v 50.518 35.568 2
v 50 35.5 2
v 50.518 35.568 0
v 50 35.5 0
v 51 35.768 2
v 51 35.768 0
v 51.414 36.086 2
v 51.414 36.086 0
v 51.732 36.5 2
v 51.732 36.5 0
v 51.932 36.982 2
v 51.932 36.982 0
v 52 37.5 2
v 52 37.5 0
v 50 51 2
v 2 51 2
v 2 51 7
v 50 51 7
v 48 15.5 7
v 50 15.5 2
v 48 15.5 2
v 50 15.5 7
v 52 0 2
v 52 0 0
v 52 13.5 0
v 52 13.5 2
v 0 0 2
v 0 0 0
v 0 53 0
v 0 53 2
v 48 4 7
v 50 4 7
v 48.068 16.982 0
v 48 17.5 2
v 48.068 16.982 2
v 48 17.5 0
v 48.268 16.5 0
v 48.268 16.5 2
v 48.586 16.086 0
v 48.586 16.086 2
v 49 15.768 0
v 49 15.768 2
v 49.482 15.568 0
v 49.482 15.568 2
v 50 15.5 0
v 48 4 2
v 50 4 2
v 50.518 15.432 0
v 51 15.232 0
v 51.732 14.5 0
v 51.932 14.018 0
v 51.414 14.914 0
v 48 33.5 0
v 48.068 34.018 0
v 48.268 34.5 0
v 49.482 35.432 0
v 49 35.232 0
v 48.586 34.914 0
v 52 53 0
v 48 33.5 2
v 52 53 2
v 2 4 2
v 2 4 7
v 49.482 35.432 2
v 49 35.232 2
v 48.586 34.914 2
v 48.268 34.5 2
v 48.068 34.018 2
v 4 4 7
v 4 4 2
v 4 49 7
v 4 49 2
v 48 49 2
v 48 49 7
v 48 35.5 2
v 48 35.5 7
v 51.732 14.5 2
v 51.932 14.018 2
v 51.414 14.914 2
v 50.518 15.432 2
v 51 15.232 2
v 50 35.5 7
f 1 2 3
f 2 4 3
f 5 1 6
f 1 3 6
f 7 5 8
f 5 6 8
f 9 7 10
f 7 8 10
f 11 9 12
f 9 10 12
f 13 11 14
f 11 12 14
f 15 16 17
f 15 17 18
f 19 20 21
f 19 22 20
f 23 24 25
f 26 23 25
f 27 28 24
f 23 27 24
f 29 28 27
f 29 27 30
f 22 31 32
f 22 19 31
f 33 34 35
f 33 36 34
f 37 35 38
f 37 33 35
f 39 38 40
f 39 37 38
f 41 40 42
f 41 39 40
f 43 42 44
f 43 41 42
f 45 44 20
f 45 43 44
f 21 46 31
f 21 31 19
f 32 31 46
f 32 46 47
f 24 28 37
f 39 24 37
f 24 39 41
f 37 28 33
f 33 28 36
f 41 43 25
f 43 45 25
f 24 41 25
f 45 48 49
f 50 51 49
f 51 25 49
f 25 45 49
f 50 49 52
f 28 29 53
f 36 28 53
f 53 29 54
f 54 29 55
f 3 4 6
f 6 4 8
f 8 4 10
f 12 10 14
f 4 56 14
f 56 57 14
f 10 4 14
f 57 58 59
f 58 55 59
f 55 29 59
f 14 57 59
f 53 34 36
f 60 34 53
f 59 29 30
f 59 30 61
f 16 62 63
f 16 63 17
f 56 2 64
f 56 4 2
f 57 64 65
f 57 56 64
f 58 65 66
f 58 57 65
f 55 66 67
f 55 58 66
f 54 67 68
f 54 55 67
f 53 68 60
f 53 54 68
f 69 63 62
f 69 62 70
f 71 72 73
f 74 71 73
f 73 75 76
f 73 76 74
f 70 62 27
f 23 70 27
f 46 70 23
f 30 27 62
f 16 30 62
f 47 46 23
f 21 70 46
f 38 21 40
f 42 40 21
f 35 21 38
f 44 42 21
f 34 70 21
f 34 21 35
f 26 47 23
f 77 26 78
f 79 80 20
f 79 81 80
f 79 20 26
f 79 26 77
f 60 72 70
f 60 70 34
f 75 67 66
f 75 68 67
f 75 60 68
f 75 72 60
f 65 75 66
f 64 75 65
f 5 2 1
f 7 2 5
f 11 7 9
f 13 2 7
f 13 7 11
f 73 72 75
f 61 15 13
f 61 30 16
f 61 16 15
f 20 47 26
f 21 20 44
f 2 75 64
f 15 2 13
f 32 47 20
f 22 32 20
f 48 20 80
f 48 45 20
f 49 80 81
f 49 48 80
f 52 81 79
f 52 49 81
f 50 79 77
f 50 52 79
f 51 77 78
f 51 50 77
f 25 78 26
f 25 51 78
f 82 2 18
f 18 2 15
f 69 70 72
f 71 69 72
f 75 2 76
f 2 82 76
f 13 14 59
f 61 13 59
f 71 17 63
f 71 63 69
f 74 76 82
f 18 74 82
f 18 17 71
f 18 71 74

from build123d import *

# Parameters (mm, degrees)
SKETCH1_W           = 52
SKETCH1_H           = 53
BOSS_EXTRUDE1_DEPTH = 2
SKETCH2_W           = 48
SKETCH2_H           = 49
SKETCH2_W_2         = 44
SKETCH2_H_2         = 45
BOSS_EXTRUDE2_DEPTH = 5
CUT_EXTRUDE1_START  = -7
SKETCH3_W           = 4
SKETCH3_H           = 20
CUT_EXTRUDE1_DEPTH  = 7
FILLET1_R           = 2
SKETCH4_W           = 48
SKETCH4_H           = 2
CUT_EXTRUDE2_DEPTH  = 5


with BuildPart() as part:
    # Sketch1 → Boss-Extrude1 (new body)
    with BuildSketch(Plane.XY):
        with Locations((26, 26.5)):
            Rectangle(SKETCH1_W, SKETCH1_H)
    extrude(amount=BOSS_EXTRUDE1_DEPTH)

    # Sketch2 → Boss-Extrude2 (add)
    with BuildSketch(Plane.XY.offset(2)):
        with Locations((26, 26.5)):
            Rectangle(SKETCH2_W, SKETCH2_H)
        with Locations((26, 26.5)):
            Rectangle(SKETCH2_W_2, SKETCH2_H_2, mode=Mode.SUBTRACT)
    extrude(amount=BOSS_EXTRUDE2_DEPTH)

    # Sketch3 → Cut-Extrude1 (cut)
    with BuildSketch(Plane(origin=(0, 0, 0), x_dir=(-1, 0, 0), z_dir=(0, 0, -1)).offset(CUT_EXTRUDE1_START)):
        with Locations((-50, 25.5)):
            Rectangle(SKETCH3_W, SKETCH3_H)
    extrude(amount=CUT_EXTRUDE1_DEPTH, mode=Mode.SUBTRACT)

    # Fillet1
    fillet1_edges = [part.edges().sort_by_distance(p)[0] for p in [
        (48, 15.5, 1),
        (48, 35.5, 1),
    ]]
    fillet(fillet1_edges, radius=FILLET1_R)
    fillet1_2_edges = [part.edges().sort_by_distance(p)[0] for p in [
        (52, 15.5, 1),
        (52, 35.5, 1),
    ]]
    fillet(fillet1_2_edges, radius=FILLET1_R - 0.0001)  # a hair under: the kernel refuses the full size

    # Sketch4 → Cut-Extrude2 (cut)
    with BuildSketch(Plane.XY.offset(7)):
        with Locations((26, 3)):
            Rectangle(SKETCH4_W, SKETCH4_H)
    extrude(amount=-CUT_EXTRUDE2_DEPTH, mode=Mode.SUBTRACT)


solid = part.part
